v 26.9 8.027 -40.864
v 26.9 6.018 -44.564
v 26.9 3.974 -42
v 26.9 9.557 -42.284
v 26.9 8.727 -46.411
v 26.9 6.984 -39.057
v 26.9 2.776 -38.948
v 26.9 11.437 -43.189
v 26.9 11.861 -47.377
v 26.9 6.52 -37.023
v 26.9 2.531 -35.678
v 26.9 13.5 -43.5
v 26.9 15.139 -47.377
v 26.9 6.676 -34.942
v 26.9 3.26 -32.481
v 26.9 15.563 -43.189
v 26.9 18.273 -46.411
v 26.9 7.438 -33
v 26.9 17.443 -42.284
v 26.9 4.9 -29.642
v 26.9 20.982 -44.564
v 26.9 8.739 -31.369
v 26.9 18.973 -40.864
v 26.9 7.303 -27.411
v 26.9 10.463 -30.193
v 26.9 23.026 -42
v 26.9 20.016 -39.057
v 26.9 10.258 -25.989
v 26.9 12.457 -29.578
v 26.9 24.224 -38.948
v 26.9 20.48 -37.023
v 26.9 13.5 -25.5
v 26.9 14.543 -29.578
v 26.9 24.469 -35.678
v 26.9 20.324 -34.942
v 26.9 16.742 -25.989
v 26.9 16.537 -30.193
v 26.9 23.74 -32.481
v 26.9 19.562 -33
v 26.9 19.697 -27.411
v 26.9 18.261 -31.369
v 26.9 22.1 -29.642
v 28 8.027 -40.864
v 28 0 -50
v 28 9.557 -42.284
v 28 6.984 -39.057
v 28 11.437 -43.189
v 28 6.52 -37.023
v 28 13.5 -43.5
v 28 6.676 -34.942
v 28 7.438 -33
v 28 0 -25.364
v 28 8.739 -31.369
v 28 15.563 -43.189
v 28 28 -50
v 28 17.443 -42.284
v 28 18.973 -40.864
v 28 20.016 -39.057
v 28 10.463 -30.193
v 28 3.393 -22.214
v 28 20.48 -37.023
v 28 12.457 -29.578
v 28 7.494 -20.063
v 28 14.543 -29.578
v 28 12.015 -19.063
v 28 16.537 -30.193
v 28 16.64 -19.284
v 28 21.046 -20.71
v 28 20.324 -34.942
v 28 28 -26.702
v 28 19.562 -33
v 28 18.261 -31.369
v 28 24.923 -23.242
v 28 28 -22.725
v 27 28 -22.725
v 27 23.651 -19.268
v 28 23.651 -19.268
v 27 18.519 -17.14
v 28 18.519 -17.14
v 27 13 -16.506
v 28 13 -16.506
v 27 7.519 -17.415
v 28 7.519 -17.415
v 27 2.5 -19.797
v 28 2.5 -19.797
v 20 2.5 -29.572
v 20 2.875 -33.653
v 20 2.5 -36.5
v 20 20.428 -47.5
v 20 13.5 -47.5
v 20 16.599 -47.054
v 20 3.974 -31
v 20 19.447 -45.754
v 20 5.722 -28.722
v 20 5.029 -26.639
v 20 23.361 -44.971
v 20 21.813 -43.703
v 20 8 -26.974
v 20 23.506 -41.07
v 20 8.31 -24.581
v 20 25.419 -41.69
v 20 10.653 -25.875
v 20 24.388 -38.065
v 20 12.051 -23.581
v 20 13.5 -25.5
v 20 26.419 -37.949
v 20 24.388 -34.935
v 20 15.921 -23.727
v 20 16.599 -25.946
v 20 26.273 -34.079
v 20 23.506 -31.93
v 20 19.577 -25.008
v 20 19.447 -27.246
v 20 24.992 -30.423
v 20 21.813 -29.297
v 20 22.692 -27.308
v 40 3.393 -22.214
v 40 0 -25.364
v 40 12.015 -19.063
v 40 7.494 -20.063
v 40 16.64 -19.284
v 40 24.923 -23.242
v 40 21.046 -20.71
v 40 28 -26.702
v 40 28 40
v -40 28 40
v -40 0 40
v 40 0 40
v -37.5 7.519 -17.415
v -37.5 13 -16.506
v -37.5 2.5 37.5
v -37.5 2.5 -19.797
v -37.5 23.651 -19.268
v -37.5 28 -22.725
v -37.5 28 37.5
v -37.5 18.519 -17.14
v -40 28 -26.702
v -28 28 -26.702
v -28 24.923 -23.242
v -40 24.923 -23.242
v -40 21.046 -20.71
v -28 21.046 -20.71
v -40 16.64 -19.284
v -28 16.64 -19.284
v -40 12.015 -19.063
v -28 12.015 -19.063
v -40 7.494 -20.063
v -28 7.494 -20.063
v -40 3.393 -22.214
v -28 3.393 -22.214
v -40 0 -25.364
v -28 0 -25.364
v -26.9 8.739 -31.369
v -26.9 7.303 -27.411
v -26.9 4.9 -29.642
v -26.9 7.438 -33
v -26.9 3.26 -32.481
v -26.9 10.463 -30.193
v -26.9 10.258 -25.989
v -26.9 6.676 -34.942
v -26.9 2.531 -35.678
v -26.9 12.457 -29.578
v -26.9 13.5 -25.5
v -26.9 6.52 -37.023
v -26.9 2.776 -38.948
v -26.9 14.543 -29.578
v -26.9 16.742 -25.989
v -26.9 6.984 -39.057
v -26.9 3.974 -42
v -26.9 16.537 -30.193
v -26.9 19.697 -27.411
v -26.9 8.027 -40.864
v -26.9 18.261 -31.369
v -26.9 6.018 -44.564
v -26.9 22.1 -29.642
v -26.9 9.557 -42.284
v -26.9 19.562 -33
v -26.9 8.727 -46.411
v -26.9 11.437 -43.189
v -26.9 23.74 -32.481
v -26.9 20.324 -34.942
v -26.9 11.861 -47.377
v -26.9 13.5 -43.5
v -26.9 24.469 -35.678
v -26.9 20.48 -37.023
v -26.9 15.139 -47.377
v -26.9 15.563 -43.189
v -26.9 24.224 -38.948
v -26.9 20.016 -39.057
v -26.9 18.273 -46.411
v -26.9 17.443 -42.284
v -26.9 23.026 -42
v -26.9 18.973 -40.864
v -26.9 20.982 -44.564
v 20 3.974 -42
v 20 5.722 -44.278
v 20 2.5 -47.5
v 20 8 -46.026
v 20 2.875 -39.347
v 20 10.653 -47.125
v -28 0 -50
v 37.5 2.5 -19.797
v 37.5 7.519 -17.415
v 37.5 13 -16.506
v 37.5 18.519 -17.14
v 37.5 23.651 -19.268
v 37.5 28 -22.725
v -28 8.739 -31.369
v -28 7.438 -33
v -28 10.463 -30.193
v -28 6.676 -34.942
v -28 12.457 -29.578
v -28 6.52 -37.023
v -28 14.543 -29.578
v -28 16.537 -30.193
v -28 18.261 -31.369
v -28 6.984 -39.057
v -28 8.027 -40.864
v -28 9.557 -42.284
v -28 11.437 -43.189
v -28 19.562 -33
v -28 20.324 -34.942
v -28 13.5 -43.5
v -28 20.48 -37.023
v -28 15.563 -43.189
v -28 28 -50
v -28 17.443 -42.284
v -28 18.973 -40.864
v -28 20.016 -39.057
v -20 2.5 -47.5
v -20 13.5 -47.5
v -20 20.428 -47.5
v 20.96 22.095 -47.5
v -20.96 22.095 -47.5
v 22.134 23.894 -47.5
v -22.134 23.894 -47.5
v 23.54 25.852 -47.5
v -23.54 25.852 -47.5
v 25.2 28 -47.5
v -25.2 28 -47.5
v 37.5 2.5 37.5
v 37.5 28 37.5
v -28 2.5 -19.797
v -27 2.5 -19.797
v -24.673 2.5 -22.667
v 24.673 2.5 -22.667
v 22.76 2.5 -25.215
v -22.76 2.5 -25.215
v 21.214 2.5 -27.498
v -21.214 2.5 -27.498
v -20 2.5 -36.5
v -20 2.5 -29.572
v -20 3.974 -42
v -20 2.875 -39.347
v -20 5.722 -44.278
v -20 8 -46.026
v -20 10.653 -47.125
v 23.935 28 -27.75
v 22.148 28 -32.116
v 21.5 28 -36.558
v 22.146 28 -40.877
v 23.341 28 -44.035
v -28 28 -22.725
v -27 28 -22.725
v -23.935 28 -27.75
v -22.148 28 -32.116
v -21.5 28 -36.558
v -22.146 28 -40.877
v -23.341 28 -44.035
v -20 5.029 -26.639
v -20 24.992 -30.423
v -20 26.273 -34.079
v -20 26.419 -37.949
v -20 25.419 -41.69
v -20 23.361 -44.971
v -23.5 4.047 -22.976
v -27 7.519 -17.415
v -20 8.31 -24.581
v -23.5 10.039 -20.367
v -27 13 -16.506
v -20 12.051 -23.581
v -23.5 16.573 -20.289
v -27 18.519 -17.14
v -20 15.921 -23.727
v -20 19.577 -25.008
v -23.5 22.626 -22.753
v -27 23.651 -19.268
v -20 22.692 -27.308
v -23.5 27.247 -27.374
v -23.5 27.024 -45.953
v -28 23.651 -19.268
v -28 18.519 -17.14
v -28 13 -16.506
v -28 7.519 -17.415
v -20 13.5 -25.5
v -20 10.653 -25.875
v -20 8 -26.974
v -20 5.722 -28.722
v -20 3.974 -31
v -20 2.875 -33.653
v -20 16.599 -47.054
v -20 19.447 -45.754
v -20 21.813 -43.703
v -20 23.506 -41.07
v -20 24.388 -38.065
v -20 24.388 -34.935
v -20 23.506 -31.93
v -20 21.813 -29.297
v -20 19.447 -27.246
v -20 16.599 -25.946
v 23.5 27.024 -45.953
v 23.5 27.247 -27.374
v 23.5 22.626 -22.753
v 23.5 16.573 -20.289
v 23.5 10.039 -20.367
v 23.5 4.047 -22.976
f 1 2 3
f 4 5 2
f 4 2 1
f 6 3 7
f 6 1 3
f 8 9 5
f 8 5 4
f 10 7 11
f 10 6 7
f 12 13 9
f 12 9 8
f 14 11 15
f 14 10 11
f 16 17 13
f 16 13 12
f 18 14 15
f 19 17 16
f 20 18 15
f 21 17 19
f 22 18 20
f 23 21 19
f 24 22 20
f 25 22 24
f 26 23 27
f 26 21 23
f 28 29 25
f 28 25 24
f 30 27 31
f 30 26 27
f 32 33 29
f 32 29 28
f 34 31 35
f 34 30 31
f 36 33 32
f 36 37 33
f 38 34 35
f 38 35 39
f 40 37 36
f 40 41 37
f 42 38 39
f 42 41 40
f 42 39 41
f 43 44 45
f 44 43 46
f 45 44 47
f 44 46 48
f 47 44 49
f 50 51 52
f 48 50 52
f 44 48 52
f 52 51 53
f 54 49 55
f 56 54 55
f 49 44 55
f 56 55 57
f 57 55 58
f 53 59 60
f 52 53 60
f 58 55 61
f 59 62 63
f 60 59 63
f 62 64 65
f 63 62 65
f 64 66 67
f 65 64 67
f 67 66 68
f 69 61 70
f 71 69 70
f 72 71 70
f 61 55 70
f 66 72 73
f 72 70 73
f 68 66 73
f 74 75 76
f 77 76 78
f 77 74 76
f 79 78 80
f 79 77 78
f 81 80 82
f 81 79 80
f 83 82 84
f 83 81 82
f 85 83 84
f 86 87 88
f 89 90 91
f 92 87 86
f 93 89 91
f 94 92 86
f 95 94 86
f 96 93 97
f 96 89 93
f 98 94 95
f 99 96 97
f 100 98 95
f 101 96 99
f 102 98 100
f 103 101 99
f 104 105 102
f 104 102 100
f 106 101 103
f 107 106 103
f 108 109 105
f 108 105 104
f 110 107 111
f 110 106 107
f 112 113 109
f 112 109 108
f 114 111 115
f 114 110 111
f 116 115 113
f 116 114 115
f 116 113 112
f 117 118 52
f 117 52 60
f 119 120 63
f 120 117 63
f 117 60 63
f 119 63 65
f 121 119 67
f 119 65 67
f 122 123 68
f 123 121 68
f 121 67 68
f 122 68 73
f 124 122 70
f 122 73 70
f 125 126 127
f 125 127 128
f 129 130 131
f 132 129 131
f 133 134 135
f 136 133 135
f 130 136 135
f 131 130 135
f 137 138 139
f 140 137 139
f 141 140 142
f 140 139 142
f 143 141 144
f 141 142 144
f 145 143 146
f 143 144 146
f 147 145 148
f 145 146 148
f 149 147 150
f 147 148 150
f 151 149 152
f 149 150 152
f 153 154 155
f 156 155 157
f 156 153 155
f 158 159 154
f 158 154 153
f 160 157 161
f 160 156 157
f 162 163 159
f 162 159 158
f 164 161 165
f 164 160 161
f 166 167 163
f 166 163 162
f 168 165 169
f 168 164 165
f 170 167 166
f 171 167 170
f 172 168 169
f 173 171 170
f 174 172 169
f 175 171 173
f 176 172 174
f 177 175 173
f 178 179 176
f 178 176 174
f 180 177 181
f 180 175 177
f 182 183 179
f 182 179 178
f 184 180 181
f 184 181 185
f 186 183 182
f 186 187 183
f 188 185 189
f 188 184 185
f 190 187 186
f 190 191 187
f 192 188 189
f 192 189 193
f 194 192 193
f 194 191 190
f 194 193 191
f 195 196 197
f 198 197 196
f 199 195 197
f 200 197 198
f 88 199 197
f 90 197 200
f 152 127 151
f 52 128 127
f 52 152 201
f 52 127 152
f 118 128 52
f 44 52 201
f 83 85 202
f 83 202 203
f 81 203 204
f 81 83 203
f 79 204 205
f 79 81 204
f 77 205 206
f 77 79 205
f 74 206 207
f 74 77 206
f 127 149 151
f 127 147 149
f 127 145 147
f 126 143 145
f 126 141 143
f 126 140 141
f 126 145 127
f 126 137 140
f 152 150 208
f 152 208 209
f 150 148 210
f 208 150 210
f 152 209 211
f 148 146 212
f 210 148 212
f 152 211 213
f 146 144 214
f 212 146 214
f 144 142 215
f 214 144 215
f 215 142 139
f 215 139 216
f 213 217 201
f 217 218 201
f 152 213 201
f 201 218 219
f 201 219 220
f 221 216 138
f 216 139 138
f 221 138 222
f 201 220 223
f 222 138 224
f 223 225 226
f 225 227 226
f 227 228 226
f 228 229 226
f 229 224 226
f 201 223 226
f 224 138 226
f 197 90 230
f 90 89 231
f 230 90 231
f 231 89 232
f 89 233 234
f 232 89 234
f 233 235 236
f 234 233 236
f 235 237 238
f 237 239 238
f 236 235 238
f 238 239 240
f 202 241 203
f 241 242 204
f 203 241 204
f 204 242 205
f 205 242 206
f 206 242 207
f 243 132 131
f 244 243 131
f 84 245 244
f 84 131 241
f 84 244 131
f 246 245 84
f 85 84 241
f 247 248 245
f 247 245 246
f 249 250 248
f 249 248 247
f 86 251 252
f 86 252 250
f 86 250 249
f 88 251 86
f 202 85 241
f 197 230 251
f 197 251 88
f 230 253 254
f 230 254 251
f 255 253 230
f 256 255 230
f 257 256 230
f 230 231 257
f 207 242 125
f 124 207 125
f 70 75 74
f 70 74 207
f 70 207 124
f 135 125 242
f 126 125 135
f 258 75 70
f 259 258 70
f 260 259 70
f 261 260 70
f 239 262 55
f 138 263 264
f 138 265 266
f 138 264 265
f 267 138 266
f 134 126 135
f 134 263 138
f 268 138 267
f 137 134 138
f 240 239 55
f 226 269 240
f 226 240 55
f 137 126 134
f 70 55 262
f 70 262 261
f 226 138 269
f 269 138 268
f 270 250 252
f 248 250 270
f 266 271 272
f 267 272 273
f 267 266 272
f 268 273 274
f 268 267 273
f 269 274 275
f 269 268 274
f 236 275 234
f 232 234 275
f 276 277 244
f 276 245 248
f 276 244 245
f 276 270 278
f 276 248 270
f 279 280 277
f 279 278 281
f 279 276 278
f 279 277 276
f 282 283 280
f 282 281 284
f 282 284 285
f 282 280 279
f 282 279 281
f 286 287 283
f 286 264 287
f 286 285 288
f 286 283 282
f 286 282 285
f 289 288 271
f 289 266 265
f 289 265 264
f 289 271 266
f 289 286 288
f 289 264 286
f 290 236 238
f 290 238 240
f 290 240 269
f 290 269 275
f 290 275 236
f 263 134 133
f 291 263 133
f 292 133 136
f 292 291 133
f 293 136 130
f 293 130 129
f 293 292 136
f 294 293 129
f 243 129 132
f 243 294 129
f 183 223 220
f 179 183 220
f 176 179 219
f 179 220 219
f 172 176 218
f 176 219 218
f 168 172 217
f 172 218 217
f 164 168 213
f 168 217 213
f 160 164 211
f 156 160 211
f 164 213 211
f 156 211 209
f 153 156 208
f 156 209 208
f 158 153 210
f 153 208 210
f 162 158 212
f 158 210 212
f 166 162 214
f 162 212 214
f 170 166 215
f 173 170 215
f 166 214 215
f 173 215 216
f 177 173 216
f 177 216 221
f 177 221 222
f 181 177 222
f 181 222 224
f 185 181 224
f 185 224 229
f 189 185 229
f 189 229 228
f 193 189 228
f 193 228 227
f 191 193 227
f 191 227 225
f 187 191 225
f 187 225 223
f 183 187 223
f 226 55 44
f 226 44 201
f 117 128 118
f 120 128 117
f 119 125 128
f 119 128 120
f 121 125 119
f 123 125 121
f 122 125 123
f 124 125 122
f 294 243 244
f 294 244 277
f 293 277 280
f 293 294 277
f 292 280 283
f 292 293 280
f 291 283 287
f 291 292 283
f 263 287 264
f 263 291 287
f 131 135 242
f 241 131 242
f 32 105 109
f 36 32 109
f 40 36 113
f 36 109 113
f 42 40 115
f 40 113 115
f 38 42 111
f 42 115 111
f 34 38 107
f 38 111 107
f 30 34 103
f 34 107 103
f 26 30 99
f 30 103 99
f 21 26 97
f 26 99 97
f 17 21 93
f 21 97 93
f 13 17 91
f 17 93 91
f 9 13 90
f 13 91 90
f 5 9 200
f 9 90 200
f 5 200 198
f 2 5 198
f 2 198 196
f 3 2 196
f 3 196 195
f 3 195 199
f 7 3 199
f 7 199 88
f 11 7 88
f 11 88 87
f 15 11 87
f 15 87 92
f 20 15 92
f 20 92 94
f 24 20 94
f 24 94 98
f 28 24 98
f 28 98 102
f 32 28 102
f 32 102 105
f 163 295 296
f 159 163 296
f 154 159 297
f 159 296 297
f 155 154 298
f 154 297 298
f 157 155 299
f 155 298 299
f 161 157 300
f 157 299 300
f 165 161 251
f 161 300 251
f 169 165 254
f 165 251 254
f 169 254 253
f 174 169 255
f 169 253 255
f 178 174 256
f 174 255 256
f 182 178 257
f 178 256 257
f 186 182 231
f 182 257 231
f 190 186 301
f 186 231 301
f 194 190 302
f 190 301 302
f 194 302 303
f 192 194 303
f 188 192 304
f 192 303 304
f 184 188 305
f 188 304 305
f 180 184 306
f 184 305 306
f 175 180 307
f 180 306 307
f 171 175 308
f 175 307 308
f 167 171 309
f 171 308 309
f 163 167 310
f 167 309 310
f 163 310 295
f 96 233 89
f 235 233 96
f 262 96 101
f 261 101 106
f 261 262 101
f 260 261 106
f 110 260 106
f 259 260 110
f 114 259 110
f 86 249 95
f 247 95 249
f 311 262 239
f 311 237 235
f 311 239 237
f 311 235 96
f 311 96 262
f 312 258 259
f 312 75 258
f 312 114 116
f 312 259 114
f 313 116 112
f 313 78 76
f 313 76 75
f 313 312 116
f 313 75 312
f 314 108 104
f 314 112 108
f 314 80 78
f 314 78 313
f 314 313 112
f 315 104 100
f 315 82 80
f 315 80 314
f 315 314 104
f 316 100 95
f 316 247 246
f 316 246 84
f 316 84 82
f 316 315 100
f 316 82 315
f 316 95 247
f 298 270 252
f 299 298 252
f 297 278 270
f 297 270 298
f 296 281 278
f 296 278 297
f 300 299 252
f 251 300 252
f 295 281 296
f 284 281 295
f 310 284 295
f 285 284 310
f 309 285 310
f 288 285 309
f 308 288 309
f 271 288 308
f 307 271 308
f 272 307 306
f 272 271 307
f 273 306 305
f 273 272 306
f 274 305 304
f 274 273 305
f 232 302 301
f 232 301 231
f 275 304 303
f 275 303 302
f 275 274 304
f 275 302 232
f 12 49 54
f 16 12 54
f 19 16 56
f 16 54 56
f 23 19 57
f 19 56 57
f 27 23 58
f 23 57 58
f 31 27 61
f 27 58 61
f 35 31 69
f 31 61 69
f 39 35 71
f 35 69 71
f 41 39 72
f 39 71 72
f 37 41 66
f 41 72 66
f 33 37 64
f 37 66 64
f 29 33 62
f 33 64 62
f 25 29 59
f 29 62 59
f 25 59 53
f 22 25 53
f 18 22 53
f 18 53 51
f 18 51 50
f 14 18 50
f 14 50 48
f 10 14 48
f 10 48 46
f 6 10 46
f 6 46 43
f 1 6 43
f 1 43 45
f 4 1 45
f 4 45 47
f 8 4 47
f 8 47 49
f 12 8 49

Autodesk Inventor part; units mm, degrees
ref_plane "YZ Plane" through (0, 0, 0) normal (1, 0, 0) x (0, 1, 0)
ref_plane "XZ Plane" through (0, 0, 0) normal (0, 1, 0) x (-1, 0, 0)
sketch "Esboço1" plane through (0, 0, 0) normal (0, 1, 0) x (-1, 0, 0)
  line L0 (-50, 50) -> (50, 50)
  line L1 (50, 50) -> (50, -50)
  line L2 (50, -50) -> (-50, -50)
  line L3 (-50, -50) -> (-50, 50)
  line L4 (-50, 50) -> (50, -50) construction
  line L5 (50, 50) -> (-50, -50) construction
  point P0 (0, 0)
  dimension "d0" = 100
  dimension "d1" = 100
extrude "Extrusão1" add sketch "Esboço1" along normal blind 28
sketch "Esboço3" plane through (0, 28, 0) normal (0, 1, 0) x (1, 0, 0)
  line L0 (50, 50) -> (-50, 50) projected
  line L1 (-40, 50) -> (40, 50)
  line L2 (-40, 50) -> (-40, -40)
  line L3 (-40, -40) -> (40, -40)
  line L4 (40, -40) -> (40, 50)
  point P0 (0, 0)
  point P1 (0, 50)
  dimension "d5" = 80
  dimension "d6" = 90
extrude "Extrusão2" cut sketch "Esboço3" against normal blind 28 keep common part
shell "Casca2" thickness 2.5 removed faces 1 at (-13.3333, 28, 10)
ref_plane "Plano de trabalho1" through (0, 28, 40) normal (1, 0, 0) x (0, 0, -1)
sketch "Esboço4" plane through (40, 28, 40) normal (1, 0, 0) x (0, 0, -1)
  circle A0 centre (76.5, -14.5) radius 17.5
  line L0 (90, -28) -> (90, 0) projected
  line L1 (0, -28) -> (90, -28) projected
  circle A1 centre (76.5, -14.5) radius 16.1
  circle A2 centre (76.5, -14.5) radius 11
  line L2 (87.5, -25.5) -> (87.5, 0) projected
  line L3 (2.5, -25.5) -> (87.5, -25.5) projected
  line L4 (90, 0) -> (66.702, 0)
  line L5 (90, 0) -> (90, -28) projected
  line L6 (90, -28) -> (87.6355, -28)
  point P0 (40, -28)
  point P1 (90, -25.6355)
  point P2 (90, -3.3645)
  point P3 (86.298, 0)
  dimension "d11" = 35
  dimension "d14" = 32.2
  dimension "d15" = 22
extrude "Extrusão3" cut sketch "Esboço4" against normal blind 12
sketch "Esboço5" plane through (28, 28, 40) normal (1, 0, 0) x (0, 0, -1)
  arc A0 (66.702, 0) -> (65.3645, -28) centre (76.5, -14.5) ccw projected
  arc A1 (65.3023, 2.0714) -> (63.7737, -29.9286) centre (76.5, -14.5) ccw
  line L0 (65.3645, -28) -> (61.7436, -28)
  line L1 (90, -28) -> (0, -28) projected
  line L2 (66.702, 0) -> (62.725, 0)
  point P0 (40, -28)
  dimension "d18" = 2.5
extrude "Extrusão4" add sketch "Esboço5" along normal up to surface (12 mm away)
sketch "Esboço6" plane through (28, 28, 40) normal (-1, 0, 0) x (0, 0, 1)
  arc A0 (-59.7967, -25.5) -> (-62.725, 0) centre (-76.5, -14.5) ccw projected
  line L0 (-66.702, 0) -> (-62.725, 0) projected
  line L1 (-87.5, -25.5) -> (-87.5, 0) projected
  line L2 (-87.5, -25.5) -> (-59.7967, -25.5)
  line L3 (-87.5, 0) -> (-66.702, 0)
  point P0 (-40, -28)
extrude "Extrusão5" add sketch "Esboço6" along normal blind 8
sketch "Esboço7" plane through (20, 28, 40) normal (-1, 0, 0) x (0, 0, 1)
  arc A0 (-59.7967, -25.5) -> (-62.725, 0) centre (-76.5, -14.5) ccw projected
  circle A1 centre (-76.5, -14.5) radius 11
  point P0 (-40, -28)
  dimension "d23" = 22
extrude "Extrusão6" cut sketch "Esboço7" against normal blind 6.9
chamfer "Chanfro1" distance 7 angle 45 1 edges at (20, 15.7817, -16.6306)
sketch "Esboço8" plane through (28, 28, 40) normal (1, 0, 0) x (0, 0, -1)
  arc A0 (66.702, 0) -> (65.3645, -28) centre (76.5, -14.5) ccw projected
  circle A1 centre (76.5, -14.5) radius 7
  point P0 (40, -28)
  dimension "d29" = 14
extrude "Extrusão7" cut sketch "Esboço8" against normal blind 8
mirror "Espelhar1" about plane through (0, 28, 40) normal (1, 0, 0) of "Extrusão3", "Extrusão4", "Extrusão5", "Extrusão6", "Chanfro1", "Extrusão7"
properties part number "Base"
